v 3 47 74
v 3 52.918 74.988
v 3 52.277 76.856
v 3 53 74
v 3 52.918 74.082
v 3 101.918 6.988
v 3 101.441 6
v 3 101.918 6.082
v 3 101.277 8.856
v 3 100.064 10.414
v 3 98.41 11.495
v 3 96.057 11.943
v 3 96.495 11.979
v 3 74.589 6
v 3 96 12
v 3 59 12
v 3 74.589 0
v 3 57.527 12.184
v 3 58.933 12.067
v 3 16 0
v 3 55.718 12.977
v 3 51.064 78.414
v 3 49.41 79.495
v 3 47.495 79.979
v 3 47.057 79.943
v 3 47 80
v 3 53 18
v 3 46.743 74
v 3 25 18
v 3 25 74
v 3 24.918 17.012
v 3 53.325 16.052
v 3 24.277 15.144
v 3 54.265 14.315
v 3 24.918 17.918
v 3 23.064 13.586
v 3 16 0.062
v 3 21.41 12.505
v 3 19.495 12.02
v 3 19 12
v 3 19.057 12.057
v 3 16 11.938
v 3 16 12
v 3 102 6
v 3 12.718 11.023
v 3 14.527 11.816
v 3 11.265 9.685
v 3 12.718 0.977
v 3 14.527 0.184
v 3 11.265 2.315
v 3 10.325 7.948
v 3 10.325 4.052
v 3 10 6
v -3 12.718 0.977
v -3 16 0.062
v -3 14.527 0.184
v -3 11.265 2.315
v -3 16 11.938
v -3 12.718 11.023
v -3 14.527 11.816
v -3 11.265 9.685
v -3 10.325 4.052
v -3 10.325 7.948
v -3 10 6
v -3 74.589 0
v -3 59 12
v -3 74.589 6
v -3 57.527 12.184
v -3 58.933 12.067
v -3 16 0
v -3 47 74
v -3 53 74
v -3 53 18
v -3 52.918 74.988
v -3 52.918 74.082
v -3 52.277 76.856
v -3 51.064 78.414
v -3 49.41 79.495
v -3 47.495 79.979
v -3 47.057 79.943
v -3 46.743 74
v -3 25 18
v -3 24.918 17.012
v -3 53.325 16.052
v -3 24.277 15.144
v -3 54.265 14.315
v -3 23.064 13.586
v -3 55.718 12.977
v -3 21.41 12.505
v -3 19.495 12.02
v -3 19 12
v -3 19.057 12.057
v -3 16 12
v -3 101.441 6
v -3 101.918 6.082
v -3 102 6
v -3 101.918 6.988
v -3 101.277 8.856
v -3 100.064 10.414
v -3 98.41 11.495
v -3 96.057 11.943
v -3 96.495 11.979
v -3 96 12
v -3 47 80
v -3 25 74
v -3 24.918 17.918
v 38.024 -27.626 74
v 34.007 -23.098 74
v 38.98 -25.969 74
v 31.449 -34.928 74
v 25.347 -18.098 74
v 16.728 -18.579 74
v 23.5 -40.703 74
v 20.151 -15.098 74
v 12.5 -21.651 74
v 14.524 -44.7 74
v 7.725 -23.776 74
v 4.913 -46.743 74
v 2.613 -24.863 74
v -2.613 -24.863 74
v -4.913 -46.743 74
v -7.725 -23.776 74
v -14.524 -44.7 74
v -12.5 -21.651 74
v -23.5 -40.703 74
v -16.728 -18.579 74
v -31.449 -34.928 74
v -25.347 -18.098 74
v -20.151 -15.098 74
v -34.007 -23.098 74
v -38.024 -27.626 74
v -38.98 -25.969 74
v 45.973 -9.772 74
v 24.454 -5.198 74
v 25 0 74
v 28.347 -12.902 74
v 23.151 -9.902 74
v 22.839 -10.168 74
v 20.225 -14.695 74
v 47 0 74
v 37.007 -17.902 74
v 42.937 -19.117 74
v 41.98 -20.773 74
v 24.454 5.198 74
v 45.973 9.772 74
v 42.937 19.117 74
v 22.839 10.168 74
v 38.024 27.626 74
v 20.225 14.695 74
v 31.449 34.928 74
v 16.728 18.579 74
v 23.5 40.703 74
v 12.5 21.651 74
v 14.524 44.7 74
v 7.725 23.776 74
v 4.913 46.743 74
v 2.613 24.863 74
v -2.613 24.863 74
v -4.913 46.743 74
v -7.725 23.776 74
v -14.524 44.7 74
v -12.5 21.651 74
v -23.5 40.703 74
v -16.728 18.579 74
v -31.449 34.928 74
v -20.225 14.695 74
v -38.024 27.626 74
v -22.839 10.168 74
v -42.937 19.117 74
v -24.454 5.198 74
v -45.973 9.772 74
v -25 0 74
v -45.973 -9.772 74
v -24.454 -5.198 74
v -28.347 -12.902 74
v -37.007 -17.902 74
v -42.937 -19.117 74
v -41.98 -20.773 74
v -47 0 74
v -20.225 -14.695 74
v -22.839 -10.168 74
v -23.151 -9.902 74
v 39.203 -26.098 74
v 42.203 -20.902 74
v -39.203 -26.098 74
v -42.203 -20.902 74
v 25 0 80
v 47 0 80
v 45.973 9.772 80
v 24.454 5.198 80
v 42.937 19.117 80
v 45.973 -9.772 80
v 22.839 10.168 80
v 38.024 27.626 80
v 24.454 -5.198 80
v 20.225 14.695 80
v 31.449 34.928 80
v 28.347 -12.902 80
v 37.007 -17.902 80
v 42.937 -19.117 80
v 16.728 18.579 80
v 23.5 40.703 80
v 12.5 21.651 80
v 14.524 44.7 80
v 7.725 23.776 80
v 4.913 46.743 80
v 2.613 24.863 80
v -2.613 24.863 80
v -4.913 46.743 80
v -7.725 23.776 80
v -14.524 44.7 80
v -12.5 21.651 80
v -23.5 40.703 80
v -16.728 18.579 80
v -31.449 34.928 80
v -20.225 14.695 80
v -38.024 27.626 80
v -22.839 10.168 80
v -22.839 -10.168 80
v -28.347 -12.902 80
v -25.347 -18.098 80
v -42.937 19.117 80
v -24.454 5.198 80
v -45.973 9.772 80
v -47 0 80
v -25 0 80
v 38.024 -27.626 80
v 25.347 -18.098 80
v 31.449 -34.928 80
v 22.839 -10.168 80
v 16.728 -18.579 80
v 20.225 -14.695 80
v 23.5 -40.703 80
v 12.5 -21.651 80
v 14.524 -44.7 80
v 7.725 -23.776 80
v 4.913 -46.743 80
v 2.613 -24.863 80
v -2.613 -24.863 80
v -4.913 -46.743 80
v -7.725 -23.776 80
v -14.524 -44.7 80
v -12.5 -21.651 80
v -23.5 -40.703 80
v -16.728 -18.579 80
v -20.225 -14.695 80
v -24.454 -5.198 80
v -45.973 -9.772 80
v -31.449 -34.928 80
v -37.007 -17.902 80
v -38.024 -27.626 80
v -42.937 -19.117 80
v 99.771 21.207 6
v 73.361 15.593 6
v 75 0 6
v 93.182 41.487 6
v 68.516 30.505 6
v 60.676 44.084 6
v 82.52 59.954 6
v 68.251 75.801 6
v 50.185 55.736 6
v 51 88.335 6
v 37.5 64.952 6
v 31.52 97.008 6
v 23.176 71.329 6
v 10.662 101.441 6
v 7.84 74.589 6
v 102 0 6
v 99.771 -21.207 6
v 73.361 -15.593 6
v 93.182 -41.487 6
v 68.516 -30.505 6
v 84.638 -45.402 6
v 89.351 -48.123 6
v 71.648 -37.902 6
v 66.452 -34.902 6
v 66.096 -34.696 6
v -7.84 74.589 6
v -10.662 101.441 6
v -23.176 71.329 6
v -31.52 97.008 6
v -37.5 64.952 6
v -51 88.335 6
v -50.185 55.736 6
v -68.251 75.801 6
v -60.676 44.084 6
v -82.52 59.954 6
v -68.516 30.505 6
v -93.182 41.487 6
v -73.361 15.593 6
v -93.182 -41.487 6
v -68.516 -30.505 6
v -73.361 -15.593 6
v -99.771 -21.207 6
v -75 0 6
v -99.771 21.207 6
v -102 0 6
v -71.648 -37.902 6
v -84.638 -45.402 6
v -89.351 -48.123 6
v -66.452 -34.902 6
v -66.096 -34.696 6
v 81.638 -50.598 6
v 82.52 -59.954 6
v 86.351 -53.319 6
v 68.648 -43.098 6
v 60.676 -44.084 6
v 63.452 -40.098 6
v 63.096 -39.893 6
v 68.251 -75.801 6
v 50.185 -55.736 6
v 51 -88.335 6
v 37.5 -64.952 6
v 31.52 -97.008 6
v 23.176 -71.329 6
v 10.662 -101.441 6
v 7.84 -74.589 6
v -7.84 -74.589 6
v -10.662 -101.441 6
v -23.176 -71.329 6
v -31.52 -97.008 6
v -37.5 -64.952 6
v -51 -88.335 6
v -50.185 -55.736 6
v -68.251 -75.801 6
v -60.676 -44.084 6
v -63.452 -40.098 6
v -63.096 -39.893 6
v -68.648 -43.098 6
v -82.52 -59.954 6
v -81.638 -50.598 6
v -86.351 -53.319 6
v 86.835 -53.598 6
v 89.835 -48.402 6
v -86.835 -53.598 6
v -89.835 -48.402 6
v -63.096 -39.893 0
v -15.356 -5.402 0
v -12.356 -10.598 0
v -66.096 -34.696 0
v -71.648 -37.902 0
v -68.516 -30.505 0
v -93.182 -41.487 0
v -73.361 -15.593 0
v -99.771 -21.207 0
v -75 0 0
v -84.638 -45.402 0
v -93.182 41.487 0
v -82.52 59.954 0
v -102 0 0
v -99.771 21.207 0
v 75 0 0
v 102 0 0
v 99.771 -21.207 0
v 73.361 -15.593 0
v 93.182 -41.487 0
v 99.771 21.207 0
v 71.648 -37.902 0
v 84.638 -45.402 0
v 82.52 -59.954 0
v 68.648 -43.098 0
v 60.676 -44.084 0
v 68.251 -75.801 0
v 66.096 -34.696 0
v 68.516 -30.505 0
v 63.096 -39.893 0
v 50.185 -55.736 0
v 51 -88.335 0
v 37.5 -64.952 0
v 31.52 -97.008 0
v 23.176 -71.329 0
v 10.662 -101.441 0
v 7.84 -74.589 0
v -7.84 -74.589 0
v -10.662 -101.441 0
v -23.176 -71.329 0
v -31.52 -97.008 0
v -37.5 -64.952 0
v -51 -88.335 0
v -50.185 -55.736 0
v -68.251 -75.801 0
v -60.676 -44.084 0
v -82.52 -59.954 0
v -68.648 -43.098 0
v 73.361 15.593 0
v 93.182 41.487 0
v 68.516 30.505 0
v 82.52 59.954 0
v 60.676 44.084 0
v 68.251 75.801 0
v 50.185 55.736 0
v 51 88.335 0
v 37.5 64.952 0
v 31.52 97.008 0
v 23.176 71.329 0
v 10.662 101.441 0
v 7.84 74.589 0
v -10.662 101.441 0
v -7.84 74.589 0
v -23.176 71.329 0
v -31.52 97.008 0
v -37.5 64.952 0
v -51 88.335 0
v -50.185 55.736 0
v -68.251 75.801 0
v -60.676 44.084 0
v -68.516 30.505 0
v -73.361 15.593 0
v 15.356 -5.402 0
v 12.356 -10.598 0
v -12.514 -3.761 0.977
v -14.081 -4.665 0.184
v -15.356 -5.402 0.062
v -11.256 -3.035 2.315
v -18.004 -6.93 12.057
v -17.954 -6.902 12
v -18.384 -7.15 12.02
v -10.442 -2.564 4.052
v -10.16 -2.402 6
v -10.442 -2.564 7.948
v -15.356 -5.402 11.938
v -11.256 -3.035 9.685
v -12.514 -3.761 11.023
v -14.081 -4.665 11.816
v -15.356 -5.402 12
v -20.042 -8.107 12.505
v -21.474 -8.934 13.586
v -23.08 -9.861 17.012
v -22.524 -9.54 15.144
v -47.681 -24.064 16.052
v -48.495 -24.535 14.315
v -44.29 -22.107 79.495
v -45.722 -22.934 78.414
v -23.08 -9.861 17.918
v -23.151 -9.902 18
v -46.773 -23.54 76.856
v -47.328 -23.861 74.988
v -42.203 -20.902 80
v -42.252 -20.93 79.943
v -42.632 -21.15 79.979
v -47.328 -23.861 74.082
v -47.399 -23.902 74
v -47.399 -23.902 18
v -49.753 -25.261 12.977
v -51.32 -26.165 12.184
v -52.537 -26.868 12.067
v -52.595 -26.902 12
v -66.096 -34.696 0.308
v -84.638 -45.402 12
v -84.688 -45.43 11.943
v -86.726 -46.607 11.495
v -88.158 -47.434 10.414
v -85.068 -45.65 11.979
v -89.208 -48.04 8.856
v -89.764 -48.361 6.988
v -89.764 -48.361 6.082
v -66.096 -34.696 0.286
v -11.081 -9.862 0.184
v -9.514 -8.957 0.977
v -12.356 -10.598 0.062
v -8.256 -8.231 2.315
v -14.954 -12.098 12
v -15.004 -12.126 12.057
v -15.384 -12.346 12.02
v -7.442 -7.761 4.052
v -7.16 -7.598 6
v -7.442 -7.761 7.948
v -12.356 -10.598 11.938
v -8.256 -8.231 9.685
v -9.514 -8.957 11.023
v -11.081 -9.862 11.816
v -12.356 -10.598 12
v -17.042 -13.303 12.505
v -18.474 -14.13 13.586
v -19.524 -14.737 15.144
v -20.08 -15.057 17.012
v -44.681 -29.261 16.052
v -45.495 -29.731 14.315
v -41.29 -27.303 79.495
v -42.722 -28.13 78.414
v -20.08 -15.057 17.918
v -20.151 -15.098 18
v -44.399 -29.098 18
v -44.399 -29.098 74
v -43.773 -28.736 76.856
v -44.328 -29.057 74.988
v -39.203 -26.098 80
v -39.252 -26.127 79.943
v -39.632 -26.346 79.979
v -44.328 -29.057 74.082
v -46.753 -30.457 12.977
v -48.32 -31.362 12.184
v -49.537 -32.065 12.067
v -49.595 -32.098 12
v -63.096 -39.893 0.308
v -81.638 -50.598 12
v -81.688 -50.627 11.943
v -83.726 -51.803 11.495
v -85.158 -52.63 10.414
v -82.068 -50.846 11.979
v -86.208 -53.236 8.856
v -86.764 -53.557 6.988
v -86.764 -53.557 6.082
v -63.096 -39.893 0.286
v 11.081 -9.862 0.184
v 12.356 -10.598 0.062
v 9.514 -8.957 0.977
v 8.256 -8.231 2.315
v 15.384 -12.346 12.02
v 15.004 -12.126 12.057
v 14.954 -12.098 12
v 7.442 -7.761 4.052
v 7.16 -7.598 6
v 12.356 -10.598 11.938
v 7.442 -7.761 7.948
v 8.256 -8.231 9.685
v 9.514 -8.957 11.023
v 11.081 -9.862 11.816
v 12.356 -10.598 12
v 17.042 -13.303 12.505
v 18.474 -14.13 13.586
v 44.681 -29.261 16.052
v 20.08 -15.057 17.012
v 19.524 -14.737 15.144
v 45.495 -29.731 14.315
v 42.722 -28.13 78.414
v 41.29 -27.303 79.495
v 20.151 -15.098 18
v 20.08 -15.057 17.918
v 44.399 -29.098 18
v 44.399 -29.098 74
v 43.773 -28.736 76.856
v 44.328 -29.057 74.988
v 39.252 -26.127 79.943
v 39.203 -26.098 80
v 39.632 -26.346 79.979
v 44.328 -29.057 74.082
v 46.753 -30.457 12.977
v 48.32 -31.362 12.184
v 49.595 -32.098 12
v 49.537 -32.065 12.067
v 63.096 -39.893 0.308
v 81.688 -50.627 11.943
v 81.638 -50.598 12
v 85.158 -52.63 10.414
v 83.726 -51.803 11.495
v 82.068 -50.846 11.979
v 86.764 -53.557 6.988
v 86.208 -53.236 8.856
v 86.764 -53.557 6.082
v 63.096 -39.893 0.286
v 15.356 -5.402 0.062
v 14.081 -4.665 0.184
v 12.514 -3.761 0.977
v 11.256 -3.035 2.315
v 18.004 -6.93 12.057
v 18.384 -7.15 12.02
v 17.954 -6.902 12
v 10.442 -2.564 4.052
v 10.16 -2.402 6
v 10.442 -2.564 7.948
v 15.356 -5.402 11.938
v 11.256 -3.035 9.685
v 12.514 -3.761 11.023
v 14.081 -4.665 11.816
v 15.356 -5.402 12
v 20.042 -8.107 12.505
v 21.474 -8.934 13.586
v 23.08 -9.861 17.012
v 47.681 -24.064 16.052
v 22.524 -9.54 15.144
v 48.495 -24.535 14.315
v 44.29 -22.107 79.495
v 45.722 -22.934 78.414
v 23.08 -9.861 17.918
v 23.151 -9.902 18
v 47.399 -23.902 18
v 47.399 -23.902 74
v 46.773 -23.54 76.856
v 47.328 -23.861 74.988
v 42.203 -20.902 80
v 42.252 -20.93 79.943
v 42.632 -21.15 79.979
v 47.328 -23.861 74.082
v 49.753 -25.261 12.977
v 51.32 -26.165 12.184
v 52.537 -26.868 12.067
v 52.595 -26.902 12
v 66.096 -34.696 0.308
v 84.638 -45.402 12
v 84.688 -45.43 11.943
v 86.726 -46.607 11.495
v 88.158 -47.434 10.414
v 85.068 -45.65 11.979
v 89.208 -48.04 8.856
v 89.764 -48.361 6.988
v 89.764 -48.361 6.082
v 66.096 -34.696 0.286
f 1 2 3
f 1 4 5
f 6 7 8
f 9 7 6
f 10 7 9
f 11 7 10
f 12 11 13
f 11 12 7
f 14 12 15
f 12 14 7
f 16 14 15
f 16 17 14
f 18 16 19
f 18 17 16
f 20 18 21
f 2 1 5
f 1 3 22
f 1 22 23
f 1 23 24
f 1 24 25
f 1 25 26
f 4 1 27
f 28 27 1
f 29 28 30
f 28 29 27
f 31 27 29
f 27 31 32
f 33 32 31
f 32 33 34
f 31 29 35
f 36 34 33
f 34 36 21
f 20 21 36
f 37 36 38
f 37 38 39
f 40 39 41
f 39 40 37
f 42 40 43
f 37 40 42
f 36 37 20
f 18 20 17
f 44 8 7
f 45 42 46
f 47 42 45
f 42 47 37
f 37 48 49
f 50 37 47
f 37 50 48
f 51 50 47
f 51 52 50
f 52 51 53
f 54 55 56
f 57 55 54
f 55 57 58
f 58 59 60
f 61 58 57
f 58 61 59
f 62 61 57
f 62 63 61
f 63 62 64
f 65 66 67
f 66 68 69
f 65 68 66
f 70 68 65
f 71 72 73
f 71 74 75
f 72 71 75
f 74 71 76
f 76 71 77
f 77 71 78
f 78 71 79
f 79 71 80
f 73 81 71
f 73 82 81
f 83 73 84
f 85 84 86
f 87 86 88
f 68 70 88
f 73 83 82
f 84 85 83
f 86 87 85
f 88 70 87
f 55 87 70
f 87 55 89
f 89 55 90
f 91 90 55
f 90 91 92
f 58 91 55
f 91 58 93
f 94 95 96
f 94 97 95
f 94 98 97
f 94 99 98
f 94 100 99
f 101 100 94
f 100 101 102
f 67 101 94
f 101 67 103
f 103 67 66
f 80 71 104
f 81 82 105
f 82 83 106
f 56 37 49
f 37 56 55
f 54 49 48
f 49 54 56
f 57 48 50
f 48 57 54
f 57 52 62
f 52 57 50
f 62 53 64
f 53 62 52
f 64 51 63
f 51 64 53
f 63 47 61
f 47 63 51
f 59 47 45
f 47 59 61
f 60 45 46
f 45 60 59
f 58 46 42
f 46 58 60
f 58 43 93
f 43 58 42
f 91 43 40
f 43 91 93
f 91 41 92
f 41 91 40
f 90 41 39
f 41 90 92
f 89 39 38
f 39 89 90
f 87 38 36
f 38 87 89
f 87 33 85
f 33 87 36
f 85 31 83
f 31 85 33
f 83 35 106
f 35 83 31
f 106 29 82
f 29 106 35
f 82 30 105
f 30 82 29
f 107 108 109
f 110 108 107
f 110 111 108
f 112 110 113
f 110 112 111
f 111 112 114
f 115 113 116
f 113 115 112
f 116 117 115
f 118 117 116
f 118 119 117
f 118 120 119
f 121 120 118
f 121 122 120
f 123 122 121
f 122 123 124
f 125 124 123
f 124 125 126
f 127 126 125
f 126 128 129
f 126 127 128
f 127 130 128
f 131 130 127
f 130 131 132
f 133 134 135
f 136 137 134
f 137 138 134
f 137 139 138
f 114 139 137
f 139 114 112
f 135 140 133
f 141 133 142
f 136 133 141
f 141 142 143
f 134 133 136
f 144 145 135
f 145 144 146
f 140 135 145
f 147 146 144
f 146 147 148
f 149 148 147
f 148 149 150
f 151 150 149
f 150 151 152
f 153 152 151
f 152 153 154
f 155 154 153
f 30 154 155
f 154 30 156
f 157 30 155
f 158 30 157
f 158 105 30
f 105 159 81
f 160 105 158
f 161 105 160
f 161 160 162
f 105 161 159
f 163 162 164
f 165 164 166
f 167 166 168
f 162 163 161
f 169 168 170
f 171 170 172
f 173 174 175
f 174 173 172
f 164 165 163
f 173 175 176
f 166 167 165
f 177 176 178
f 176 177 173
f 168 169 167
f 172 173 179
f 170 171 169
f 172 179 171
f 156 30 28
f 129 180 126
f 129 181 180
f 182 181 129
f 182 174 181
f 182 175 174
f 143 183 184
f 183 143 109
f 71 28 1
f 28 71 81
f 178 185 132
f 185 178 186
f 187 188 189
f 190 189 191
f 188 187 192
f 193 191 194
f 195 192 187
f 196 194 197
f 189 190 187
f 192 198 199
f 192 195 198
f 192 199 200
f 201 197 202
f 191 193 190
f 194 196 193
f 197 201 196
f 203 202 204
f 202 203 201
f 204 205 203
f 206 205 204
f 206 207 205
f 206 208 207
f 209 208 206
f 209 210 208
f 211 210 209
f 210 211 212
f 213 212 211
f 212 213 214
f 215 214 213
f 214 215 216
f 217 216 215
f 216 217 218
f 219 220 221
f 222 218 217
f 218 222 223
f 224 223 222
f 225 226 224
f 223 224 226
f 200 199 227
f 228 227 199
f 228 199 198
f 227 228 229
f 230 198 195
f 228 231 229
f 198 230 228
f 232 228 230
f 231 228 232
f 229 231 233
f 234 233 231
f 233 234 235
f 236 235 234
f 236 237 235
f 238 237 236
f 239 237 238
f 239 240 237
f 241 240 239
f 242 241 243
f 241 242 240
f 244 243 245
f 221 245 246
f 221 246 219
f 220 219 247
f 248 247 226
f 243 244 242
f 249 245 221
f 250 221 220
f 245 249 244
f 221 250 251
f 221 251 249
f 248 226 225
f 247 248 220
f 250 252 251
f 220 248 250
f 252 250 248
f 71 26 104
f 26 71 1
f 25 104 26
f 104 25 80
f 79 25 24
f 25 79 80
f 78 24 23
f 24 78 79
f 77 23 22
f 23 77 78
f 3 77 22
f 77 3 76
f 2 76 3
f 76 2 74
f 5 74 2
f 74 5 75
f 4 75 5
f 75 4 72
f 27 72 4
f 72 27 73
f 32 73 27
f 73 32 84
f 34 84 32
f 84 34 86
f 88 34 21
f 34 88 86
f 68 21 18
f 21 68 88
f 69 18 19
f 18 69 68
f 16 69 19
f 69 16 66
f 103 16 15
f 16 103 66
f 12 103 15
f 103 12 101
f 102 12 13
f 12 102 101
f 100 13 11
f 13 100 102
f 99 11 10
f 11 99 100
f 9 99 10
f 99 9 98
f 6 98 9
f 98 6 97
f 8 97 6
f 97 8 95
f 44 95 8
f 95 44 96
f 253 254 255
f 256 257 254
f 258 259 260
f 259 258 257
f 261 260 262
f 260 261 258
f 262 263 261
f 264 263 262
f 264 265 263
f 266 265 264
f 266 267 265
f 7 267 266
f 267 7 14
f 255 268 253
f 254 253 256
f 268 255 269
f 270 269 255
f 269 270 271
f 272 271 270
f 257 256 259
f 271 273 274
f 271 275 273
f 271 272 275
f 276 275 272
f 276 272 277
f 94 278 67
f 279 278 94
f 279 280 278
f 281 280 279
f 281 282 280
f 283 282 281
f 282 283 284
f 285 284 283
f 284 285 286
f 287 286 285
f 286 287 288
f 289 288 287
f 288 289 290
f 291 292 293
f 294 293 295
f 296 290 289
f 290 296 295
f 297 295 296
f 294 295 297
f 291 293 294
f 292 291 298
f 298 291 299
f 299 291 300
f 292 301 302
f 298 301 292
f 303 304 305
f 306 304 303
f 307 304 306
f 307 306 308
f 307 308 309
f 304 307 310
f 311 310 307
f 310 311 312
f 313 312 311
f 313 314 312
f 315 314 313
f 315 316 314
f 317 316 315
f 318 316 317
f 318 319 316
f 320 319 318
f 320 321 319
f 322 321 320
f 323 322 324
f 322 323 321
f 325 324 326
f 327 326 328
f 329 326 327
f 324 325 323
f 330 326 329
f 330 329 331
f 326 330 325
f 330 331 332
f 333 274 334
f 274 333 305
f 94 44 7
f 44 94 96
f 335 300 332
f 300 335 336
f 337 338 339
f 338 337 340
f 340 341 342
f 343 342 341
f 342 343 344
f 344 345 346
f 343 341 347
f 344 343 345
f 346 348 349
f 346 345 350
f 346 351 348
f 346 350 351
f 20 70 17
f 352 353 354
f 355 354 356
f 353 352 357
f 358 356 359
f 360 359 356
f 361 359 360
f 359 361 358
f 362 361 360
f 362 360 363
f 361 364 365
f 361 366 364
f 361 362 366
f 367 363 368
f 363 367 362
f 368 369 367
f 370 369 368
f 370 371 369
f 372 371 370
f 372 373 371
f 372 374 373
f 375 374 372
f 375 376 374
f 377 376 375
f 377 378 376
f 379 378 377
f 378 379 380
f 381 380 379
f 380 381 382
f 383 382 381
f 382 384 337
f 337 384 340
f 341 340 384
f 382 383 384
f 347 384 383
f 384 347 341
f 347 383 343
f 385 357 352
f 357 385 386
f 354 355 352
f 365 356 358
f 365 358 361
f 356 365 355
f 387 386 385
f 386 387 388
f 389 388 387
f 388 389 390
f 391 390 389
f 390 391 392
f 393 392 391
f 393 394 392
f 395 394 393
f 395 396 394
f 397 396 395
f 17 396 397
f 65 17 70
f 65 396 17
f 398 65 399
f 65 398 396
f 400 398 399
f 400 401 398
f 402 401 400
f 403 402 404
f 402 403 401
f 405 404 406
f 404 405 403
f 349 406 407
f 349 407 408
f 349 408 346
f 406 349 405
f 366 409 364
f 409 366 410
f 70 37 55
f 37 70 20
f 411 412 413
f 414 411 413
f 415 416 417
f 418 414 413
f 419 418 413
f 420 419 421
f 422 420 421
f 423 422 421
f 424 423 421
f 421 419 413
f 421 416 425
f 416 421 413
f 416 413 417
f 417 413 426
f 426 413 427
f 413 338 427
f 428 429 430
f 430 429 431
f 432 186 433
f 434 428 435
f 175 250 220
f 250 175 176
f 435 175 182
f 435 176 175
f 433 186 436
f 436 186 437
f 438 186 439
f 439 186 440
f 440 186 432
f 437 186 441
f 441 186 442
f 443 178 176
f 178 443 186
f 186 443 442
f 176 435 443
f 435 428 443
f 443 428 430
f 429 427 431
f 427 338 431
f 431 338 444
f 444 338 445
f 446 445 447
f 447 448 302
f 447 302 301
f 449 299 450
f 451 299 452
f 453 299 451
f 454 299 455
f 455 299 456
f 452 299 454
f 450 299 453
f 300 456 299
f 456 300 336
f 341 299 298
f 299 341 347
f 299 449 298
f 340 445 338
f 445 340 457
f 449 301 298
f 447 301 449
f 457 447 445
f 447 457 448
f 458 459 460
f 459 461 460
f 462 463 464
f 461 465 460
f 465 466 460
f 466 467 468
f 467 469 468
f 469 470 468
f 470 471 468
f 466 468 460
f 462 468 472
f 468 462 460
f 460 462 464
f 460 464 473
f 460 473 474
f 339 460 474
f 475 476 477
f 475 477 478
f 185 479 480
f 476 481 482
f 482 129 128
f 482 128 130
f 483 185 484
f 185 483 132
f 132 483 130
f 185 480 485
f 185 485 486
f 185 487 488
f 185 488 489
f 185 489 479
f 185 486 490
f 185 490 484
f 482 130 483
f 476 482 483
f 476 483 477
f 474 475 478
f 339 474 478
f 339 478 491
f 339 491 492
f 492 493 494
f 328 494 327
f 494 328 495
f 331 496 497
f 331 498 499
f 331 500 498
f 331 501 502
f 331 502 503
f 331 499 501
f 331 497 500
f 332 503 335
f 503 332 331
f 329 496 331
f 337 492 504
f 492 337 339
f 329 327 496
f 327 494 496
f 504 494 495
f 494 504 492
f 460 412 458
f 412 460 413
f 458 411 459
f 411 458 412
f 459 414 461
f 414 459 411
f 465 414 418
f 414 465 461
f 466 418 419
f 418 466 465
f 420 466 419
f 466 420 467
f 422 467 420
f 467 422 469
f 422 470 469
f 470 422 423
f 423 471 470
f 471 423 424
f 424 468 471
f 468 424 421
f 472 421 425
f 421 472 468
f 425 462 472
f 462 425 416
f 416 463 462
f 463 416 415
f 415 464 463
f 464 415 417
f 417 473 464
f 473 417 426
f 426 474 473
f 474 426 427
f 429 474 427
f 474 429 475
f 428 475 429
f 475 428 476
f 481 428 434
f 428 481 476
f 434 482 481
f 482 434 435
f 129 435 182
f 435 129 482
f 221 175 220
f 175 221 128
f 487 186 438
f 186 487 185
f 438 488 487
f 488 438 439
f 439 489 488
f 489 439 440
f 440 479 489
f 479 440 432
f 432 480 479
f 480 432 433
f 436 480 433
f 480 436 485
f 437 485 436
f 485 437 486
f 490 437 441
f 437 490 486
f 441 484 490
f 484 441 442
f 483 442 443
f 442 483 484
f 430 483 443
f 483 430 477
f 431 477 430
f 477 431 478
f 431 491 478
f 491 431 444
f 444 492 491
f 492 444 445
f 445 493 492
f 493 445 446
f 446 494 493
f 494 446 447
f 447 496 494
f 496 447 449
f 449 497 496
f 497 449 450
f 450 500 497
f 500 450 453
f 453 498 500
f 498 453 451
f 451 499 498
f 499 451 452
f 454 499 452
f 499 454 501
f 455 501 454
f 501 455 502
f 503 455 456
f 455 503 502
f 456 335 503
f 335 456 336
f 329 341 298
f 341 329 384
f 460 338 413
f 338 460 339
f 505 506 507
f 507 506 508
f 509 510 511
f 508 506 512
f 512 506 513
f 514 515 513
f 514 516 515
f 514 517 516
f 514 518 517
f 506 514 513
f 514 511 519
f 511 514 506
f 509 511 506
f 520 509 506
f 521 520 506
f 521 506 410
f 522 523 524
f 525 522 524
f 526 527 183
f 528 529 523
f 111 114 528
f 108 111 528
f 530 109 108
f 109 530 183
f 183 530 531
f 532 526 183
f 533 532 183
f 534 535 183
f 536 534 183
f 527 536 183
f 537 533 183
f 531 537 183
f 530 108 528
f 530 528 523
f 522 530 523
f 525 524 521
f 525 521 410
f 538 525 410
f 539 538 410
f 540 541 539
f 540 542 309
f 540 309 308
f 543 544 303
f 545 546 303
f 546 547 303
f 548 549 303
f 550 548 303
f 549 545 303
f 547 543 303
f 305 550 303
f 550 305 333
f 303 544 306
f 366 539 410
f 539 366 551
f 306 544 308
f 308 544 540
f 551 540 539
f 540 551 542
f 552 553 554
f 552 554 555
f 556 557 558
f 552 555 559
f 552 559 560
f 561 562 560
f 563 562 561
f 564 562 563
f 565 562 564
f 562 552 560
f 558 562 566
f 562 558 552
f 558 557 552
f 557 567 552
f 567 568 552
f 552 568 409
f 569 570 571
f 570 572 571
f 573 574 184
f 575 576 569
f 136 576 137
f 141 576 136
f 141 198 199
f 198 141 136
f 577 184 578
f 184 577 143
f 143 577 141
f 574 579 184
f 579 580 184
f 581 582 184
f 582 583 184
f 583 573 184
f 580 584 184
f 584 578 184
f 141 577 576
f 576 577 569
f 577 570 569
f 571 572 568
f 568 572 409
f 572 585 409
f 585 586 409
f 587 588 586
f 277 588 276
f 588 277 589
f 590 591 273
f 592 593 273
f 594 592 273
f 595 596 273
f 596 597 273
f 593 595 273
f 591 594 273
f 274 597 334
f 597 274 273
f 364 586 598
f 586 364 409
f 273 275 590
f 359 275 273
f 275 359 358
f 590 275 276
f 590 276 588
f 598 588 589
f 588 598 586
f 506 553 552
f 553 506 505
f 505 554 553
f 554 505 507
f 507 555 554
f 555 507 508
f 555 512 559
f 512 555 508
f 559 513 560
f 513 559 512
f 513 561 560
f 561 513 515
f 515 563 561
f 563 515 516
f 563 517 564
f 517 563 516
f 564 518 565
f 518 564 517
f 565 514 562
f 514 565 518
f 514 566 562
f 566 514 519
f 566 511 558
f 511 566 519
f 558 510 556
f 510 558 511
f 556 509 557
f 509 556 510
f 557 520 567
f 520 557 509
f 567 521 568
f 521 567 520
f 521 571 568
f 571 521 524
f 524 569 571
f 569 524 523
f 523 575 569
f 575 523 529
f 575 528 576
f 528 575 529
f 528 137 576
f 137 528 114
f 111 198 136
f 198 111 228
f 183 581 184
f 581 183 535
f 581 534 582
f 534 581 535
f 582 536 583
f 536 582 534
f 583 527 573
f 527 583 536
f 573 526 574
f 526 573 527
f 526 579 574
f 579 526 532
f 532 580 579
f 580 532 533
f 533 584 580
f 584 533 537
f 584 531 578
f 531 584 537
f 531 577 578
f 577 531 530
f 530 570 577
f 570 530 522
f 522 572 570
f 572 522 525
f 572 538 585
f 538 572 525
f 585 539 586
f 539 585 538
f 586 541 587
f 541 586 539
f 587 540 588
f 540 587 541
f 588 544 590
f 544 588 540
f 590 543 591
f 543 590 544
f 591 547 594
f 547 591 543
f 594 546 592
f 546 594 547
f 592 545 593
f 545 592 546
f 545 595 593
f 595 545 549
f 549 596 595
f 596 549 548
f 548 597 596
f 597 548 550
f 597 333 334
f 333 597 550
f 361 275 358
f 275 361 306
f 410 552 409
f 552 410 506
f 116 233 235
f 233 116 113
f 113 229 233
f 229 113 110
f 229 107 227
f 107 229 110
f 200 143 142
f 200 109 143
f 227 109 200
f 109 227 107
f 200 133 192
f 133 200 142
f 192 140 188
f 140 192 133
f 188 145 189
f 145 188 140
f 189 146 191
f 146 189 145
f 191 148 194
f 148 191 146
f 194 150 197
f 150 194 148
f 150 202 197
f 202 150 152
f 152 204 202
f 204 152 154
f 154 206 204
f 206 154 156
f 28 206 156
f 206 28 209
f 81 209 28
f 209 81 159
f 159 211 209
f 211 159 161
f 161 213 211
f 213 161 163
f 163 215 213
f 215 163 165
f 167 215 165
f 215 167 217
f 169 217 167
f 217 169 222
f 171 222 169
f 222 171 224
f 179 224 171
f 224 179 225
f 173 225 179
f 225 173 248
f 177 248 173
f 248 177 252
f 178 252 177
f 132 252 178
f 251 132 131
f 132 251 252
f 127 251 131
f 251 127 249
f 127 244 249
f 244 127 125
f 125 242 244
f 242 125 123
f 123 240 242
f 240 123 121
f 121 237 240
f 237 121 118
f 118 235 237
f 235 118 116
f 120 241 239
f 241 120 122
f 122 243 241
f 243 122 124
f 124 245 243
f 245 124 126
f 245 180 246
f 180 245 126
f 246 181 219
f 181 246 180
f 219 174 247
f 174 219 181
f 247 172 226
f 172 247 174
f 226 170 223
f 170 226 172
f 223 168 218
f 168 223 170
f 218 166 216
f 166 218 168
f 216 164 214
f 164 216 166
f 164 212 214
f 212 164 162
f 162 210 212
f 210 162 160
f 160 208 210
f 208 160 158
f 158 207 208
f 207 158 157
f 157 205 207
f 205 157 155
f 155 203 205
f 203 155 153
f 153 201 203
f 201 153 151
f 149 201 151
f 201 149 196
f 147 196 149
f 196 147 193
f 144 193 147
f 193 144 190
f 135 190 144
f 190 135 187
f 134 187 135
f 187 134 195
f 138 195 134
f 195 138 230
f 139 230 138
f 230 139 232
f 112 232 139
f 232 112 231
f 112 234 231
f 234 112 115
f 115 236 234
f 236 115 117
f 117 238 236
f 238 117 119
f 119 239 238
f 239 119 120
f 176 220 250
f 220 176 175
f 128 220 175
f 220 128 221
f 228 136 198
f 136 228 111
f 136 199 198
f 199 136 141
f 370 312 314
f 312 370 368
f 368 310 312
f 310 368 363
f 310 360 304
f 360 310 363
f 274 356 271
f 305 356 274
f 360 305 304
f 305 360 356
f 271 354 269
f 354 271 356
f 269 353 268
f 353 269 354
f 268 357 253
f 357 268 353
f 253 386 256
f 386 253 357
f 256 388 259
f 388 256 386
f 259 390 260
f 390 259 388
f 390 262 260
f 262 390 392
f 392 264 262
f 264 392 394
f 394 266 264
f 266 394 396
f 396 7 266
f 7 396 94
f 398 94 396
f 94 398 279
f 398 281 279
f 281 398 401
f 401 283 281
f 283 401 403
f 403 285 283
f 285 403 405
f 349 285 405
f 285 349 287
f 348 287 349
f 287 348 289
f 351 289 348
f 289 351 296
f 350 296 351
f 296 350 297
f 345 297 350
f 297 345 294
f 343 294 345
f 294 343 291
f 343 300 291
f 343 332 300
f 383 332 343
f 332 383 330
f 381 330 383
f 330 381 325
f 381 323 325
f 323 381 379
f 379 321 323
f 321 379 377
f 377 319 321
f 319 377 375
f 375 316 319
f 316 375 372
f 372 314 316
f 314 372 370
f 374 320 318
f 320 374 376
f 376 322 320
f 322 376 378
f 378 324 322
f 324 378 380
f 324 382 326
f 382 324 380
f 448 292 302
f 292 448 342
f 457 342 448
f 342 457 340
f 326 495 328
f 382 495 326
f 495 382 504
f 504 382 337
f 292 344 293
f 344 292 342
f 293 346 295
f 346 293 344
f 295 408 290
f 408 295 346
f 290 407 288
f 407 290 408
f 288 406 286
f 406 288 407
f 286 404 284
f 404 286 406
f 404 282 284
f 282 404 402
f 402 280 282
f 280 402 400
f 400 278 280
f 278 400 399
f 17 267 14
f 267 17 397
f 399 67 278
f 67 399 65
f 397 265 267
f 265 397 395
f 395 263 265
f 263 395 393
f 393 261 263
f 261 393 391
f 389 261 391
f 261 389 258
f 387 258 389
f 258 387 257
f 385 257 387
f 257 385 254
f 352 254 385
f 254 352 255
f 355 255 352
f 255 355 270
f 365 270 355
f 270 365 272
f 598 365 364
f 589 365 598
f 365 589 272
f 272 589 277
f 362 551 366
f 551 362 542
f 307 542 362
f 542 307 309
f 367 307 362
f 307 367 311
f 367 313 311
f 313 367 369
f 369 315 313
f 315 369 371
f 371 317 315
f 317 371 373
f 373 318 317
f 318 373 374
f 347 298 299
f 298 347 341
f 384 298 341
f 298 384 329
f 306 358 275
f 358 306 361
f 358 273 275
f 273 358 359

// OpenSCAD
thickness = 6;
locklen1 = 15;
locklen2 = 10;
boltlen = 15;
midhole = 10;
inner1_to_inner2 = 50;
total_height = 80;

module shape_tripod()
{
	x1 = 0;
	x2 = x1 + thickness;
	x3 = x2 + locklen1;
	x4 = x3 + thickness;
	x5 = x4 + inner1_to_inner2;
	x6 = x5 - thickness;
	x7 = x6 - locklen2;
	x8 = x7 - thickness;
	x9 = x8 - thickness;
	x10 = x9 - thickness;
	
	y1 = 0;
	y2 = y1 + thickness;
	y3 = y2 + thickness;
	y4 = y3 + thickness;
	y5 = y3 + total_height - 3*thickness;
	y6 = y5 + thickness;
	
	union()
	{
		difference() {
			polygon([
				[ x1, y2 ], [ x2, y2 ],
				[ x2, y1 ], [ x3, y1 ], [ x3, y2 ],
				[ x4, y2 ], [ x4, y1 ], [ x5, y1 ],
				[ x5 + thickness, y3 ], [ x5, y4 ],
				[ x5, y5 ],
				[ x6, y5 ], [ x6, y6 ], [ x7, y6 ], [ x7, y5 ], [ x8, y5 ],
				[ x8, y6 ], [ x9, y5 ],
				[ x9, y4 ], [ x10, y3 ],
				[ x2, y3 ]
			]);
			translate([ x10, y4 ]) circle(thickness);
			translate([ x5 + thickness, y4 ]) circle(thickness);
		}
	
		translate([ x5, y1 ])
		square([ boltlen - thickness, thickness*2 ]);
	
		translate([ x5 + boltlen - thickness, y2 ]) circle(thickness);
	
		translate([ x2, y2 ]) intersection() {
			circle(thickness);
			translate([ -thickness*2, 0 ]) square(thickness*2);
		}
	
		translate([ x8, y5 ]) intersection() {
			circle(thickness);
			translate([ -thickness*2, 0 ]) square(thickness*2);
		}
	}
}

module shape_inner_disc()
{
	difference() {
		circle(midhole + boltlen + 2*thickness + locklen2);
		for (alpha = [ 0, 120, 240 ])
			rotate(alpha) translate([ 0, midhole + boltlen + thickness + locklen2/2 ]) square([ thickness, locklen2 ], true);
		circle(midhole + boltlen);
	}
}

module shape_outer_disc()
{
	difference() {
		circle(midhole + boltlen + inner1_to_inner2 + 2*thickness + locklen1);
		for (alpha = [ 0, 120, 240 ])
			rotate(alpha) translate([ 0, midhole + boltlen + inner1_to_inner2 + thickness + locklen1/2 ]) square([ thickness, locklen1 ], true);
		circle(midhole + boltlen + inner1_to_inner2);
	}
}

module parts()
{
	tripod_x_off = locklen1 - locklen2 + inner1_to_inner2;
	tripod_y_off = max(midhole + boltlen + inner1_to_inner2 + 4*thickness + locklen1, total_height);

	shape_inner_disc();
	shape_outer_disc();

	for (s = [ [1,1], [-1,1], [1,-1] ])
		render() scale(s) translate([ tripod_x_off, -tripod_y_off ]) shape_tripod();
}

module exploded()
{
	translate([ 0, 0, total_height + 2*thickness ]) linear_extrude(height = thickness, convexity = 4) shape_inner_disc();
	linear_extrude(height = thickness, convexity = 4) shape_outer_disc();

	color([ 0.7, 0.7, 1 ]) for (alpha = [ 0, 120, 240 ])
		rotate(alpha) translate([ 0, thickness*2 + locklen1 + inner1_to_inner2 + boltlen + midhole, 1.5*thickness ])
			rotate([ 90, 0, -90 ]) linear_extrude(height = thickness, convexity = 10, center = true) shape_tripod();
}

module bottle()
{
	r = boltlen + midhole;
	h = total_height - thickness*2;

	rotate_extrude(convexity = 2)
	{
		square([ r, h ]);

		translate([ 0, h ])
		intersection() {
			square([ r, r ]);
			scale([ 1, 0.7 ]) circle(r);
		}

		translate([ 0, h+r ])
		intersection() {
			translate([ 0, -r/2 ]) square([ r/2, r ]);
			circle(r/2);
		}
	}
}

module assembled()
{
	translate([ 0, 0, total_height - thickness ]) linear_extrude(height = thickness, convexity = 4) shape_inner_disc();
	linear_extrude(height = thickness, convexity = 4) shape_outer_disc();

	color([ 0.7, 0.7, 1 ]) for (alpha = [ 0, 120, 240 ])
		rotate(alpha) translate([ 0, thickness*2 + locklen1 + inner1_to_inner2 + boltlen + midhole, 0 ])
			rotate([ 90, 0, -90 ]) linear_extrude(height = thickness, convexity = 10, center = true) shape_tripod();

	% translate([ 0, 0, thickness*2]) bottle();
}

// parts();
// exploded();
assembled();
